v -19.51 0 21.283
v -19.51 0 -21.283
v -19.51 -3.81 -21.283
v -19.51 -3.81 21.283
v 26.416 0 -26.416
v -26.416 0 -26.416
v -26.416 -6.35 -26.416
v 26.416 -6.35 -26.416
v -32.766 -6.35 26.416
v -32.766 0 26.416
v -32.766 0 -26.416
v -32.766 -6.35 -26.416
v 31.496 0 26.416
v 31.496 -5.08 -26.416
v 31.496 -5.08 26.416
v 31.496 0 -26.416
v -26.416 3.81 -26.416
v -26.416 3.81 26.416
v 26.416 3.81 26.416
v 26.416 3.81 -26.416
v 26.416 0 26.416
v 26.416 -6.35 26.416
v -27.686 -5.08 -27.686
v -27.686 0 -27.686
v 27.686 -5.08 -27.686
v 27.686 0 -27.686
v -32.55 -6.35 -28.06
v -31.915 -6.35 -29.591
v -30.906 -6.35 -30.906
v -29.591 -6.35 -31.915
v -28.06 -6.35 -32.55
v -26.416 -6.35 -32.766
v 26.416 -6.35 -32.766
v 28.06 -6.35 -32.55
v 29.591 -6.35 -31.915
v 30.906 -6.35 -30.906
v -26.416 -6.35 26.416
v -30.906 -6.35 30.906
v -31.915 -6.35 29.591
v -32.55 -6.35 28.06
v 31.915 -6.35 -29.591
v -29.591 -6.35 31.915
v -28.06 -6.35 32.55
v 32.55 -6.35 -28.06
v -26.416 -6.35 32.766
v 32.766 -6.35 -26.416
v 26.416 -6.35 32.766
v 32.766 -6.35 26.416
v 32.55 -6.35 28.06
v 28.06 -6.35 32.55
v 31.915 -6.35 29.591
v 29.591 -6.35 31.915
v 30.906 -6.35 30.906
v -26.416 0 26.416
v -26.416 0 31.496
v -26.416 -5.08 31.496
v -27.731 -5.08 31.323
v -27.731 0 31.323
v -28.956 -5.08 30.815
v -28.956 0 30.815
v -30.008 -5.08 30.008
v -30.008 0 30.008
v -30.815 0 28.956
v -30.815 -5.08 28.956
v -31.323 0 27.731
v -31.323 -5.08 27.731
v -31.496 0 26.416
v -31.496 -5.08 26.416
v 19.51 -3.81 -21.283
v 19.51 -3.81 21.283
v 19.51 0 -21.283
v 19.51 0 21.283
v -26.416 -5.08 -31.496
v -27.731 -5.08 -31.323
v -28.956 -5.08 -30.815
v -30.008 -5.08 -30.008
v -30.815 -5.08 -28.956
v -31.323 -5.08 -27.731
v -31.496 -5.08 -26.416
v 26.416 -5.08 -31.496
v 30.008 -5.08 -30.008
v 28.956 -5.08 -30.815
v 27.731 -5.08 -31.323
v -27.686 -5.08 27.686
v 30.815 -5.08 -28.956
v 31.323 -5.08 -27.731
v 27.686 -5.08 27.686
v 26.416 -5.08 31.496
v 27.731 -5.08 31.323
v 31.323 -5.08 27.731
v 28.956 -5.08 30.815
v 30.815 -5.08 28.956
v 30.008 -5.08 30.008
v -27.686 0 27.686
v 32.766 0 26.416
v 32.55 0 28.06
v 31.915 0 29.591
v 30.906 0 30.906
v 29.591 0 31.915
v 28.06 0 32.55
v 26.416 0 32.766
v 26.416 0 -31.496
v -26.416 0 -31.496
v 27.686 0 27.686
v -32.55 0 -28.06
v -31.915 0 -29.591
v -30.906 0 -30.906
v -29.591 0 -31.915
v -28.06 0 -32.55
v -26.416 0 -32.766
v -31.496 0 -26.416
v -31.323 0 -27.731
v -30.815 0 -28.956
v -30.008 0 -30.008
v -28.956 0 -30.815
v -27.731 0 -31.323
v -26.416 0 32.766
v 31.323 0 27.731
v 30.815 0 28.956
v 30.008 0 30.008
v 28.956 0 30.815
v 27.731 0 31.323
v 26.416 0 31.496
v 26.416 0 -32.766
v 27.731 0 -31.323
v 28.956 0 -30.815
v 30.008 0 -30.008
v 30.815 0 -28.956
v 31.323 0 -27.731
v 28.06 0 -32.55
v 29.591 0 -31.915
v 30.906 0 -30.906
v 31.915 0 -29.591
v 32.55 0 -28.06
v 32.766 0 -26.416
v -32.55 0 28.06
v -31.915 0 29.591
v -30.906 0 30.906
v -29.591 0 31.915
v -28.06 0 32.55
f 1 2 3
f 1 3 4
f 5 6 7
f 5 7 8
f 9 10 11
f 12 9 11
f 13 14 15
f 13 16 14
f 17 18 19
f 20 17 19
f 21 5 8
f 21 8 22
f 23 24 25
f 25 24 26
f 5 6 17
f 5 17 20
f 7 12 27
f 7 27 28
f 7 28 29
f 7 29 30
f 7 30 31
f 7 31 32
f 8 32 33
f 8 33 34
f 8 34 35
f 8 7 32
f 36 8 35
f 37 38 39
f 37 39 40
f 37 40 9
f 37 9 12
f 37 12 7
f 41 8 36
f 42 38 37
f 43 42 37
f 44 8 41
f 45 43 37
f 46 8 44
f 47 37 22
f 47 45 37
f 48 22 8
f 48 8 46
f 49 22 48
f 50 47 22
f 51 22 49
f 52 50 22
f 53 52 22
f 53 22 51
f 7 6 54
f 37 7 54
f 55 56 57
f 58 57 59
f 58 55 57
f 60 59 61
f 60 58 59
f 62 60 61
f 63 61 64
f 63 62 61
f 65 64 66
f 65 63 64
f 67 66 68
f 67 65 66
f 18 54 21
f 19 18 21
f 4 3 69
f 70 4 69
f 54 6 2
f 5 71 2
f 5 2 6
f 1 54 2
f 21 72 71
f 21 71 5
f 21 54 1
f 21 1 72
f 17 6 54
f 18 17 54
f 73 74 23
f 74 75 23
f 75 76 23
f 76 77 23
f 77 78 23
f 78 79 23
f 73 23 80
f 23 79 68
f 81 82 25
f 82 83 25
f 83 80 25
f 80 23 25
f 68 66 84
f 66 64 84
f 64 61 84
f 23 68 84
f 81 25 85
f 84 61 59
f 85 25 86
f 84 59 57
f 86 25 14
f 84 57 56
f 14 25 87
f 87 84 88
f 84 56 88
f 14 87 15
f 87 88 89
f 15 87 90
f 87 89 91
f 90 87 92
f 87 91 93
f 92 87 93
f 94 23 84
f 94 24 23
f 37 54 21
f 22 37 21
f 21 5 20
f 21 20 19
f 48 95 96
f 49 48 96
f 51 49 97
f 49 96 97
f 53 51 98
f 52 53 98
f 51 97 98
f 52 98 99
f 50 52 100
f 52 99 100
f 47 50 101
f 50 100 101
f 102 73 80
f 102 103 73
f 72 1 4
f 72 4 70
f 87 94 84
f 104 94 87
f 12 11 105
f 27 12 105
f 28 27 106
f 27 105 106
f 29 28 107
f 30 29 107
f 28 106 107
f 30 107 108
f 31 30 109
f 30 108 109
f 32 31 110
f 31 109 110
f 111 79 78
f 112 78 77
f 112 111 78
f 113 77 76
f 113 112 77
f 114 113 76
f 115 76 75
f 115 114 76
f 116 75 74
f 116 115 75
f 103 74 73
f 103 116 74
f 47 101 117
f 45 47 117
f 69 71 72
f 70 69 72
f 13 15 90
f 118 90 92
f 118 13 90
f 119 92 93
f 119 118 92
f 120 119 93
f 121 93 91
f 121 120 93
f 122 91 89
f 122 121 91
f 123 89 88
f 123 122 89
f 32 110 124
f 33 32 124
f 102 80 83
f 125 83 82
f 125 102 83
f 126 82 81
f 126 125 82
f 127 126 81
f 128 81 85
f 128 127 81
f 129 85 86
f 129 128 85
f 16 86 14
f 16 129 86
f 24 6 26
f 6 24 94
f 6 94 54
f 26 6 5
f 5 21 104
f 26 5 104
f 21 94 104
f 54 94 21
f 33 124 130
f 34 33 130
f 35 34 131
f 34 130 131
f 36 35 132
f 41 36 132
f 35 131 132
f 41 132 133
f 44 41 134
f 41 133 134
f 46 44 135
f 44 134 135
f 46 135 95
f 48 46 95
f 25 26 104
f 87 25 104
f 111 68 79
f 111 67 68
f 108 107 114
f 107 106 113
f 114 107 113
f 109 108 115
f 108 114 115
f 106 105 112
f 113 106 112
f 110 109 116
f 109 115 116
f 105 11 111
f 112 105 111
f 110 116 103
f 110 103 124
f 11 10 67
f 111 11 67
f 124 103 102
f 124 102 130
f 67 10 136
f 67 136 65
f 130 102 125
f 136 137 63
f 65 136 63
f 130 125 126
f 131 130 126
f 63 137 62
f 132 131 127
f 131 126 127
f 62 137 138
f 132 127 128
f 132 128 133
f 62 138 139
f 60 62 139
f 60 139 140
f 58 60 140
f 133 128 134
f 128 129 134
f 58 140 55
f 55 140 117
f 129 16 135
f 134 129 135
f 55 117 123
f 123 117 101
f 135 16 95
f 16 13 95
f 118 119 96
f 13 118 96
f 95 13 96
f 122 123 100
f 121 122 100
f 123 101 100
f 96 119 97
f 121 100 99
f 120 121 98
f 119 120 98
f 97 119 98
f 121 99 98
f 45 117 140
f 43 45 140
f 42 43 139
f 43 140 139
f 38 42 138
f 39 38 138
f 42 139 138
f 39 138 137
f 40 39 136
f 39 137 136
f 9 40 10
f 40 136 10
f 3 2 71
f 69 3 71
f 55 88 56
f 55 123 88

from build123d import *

# Parameters (mm, degrees)
F0_W     = 52.832
F0_H     = 52.832
F1_DEPTH = 6.35
F0_W_2   = 39.0196554363
F0_H_2   = 42.5668954849
F2_DEPTH = 3.81
F3_DEPTH = 3.81
F4_T     = -1.27


with BuildPart() as f1:
    # F0 (on Front) → F1 (new body)
    with BuildSketch(Plane.XZ):
        with BuildLine():
            ThreePointArc((-32.766, -26.416), (-30.9061280605, -30.9061280605), (-26.416, -32.766))
            Line((-26.416, -32.766), (26.416, -32.766))
            ThreePointArc((26.416, -32.766), (30.9061280605, -30.9061280605), (32.766, -26.416))
            Line((32.766, -26.416), (32.766, 26.416))
            ThreePointArc((32.766, 26.416), (30.9061280605, 30.9061280605), (26.416, 32.766))
            Line((26.416, 32.766), (-26.416, 32.766))
            ThreePointArc((-26.416, 32.766), (-30.9061280605, 30.9061280605), (-32.766, 26.416))
            Line((-32.766, 26.416), (-32.766, -26.416))
        make_face()
        Rectangle(F0_W, F0_H, mode=Mode.SUBTRACT)
    extrude(amount=F1_DEPTH)

    # F4
    f4_openings = [f1.faces().sort_by_distance(p)[0] for p in [
        (-30.250808, 0, -30.250808),
    ]]
    offset(amount=F4_T, openings=f4_openings, kind=Kind.INTERSECTION)


with BuildPart() as f2:
    # F0 (on Front) → F2 (new body)
    with BuildSketch(Plane.XZ):
        Rectangle(F0_W, F0_H)
        Rectangle(F0_W_2, F0_H_2, mode=Mode.SUBTRACT)
        Rectangle(F0_W_2, F0_H_2)
    extrude(amount=-F2_DEPTH)

    # F0 (on Front) → F3 (join)
    with BuildSketch(Plane.XZ):
        Rectangle(F0_W_2, F0_H_2)
    extrude(amount=F3_DEPTH)


solid = Compound([f1.part, f2.part])
